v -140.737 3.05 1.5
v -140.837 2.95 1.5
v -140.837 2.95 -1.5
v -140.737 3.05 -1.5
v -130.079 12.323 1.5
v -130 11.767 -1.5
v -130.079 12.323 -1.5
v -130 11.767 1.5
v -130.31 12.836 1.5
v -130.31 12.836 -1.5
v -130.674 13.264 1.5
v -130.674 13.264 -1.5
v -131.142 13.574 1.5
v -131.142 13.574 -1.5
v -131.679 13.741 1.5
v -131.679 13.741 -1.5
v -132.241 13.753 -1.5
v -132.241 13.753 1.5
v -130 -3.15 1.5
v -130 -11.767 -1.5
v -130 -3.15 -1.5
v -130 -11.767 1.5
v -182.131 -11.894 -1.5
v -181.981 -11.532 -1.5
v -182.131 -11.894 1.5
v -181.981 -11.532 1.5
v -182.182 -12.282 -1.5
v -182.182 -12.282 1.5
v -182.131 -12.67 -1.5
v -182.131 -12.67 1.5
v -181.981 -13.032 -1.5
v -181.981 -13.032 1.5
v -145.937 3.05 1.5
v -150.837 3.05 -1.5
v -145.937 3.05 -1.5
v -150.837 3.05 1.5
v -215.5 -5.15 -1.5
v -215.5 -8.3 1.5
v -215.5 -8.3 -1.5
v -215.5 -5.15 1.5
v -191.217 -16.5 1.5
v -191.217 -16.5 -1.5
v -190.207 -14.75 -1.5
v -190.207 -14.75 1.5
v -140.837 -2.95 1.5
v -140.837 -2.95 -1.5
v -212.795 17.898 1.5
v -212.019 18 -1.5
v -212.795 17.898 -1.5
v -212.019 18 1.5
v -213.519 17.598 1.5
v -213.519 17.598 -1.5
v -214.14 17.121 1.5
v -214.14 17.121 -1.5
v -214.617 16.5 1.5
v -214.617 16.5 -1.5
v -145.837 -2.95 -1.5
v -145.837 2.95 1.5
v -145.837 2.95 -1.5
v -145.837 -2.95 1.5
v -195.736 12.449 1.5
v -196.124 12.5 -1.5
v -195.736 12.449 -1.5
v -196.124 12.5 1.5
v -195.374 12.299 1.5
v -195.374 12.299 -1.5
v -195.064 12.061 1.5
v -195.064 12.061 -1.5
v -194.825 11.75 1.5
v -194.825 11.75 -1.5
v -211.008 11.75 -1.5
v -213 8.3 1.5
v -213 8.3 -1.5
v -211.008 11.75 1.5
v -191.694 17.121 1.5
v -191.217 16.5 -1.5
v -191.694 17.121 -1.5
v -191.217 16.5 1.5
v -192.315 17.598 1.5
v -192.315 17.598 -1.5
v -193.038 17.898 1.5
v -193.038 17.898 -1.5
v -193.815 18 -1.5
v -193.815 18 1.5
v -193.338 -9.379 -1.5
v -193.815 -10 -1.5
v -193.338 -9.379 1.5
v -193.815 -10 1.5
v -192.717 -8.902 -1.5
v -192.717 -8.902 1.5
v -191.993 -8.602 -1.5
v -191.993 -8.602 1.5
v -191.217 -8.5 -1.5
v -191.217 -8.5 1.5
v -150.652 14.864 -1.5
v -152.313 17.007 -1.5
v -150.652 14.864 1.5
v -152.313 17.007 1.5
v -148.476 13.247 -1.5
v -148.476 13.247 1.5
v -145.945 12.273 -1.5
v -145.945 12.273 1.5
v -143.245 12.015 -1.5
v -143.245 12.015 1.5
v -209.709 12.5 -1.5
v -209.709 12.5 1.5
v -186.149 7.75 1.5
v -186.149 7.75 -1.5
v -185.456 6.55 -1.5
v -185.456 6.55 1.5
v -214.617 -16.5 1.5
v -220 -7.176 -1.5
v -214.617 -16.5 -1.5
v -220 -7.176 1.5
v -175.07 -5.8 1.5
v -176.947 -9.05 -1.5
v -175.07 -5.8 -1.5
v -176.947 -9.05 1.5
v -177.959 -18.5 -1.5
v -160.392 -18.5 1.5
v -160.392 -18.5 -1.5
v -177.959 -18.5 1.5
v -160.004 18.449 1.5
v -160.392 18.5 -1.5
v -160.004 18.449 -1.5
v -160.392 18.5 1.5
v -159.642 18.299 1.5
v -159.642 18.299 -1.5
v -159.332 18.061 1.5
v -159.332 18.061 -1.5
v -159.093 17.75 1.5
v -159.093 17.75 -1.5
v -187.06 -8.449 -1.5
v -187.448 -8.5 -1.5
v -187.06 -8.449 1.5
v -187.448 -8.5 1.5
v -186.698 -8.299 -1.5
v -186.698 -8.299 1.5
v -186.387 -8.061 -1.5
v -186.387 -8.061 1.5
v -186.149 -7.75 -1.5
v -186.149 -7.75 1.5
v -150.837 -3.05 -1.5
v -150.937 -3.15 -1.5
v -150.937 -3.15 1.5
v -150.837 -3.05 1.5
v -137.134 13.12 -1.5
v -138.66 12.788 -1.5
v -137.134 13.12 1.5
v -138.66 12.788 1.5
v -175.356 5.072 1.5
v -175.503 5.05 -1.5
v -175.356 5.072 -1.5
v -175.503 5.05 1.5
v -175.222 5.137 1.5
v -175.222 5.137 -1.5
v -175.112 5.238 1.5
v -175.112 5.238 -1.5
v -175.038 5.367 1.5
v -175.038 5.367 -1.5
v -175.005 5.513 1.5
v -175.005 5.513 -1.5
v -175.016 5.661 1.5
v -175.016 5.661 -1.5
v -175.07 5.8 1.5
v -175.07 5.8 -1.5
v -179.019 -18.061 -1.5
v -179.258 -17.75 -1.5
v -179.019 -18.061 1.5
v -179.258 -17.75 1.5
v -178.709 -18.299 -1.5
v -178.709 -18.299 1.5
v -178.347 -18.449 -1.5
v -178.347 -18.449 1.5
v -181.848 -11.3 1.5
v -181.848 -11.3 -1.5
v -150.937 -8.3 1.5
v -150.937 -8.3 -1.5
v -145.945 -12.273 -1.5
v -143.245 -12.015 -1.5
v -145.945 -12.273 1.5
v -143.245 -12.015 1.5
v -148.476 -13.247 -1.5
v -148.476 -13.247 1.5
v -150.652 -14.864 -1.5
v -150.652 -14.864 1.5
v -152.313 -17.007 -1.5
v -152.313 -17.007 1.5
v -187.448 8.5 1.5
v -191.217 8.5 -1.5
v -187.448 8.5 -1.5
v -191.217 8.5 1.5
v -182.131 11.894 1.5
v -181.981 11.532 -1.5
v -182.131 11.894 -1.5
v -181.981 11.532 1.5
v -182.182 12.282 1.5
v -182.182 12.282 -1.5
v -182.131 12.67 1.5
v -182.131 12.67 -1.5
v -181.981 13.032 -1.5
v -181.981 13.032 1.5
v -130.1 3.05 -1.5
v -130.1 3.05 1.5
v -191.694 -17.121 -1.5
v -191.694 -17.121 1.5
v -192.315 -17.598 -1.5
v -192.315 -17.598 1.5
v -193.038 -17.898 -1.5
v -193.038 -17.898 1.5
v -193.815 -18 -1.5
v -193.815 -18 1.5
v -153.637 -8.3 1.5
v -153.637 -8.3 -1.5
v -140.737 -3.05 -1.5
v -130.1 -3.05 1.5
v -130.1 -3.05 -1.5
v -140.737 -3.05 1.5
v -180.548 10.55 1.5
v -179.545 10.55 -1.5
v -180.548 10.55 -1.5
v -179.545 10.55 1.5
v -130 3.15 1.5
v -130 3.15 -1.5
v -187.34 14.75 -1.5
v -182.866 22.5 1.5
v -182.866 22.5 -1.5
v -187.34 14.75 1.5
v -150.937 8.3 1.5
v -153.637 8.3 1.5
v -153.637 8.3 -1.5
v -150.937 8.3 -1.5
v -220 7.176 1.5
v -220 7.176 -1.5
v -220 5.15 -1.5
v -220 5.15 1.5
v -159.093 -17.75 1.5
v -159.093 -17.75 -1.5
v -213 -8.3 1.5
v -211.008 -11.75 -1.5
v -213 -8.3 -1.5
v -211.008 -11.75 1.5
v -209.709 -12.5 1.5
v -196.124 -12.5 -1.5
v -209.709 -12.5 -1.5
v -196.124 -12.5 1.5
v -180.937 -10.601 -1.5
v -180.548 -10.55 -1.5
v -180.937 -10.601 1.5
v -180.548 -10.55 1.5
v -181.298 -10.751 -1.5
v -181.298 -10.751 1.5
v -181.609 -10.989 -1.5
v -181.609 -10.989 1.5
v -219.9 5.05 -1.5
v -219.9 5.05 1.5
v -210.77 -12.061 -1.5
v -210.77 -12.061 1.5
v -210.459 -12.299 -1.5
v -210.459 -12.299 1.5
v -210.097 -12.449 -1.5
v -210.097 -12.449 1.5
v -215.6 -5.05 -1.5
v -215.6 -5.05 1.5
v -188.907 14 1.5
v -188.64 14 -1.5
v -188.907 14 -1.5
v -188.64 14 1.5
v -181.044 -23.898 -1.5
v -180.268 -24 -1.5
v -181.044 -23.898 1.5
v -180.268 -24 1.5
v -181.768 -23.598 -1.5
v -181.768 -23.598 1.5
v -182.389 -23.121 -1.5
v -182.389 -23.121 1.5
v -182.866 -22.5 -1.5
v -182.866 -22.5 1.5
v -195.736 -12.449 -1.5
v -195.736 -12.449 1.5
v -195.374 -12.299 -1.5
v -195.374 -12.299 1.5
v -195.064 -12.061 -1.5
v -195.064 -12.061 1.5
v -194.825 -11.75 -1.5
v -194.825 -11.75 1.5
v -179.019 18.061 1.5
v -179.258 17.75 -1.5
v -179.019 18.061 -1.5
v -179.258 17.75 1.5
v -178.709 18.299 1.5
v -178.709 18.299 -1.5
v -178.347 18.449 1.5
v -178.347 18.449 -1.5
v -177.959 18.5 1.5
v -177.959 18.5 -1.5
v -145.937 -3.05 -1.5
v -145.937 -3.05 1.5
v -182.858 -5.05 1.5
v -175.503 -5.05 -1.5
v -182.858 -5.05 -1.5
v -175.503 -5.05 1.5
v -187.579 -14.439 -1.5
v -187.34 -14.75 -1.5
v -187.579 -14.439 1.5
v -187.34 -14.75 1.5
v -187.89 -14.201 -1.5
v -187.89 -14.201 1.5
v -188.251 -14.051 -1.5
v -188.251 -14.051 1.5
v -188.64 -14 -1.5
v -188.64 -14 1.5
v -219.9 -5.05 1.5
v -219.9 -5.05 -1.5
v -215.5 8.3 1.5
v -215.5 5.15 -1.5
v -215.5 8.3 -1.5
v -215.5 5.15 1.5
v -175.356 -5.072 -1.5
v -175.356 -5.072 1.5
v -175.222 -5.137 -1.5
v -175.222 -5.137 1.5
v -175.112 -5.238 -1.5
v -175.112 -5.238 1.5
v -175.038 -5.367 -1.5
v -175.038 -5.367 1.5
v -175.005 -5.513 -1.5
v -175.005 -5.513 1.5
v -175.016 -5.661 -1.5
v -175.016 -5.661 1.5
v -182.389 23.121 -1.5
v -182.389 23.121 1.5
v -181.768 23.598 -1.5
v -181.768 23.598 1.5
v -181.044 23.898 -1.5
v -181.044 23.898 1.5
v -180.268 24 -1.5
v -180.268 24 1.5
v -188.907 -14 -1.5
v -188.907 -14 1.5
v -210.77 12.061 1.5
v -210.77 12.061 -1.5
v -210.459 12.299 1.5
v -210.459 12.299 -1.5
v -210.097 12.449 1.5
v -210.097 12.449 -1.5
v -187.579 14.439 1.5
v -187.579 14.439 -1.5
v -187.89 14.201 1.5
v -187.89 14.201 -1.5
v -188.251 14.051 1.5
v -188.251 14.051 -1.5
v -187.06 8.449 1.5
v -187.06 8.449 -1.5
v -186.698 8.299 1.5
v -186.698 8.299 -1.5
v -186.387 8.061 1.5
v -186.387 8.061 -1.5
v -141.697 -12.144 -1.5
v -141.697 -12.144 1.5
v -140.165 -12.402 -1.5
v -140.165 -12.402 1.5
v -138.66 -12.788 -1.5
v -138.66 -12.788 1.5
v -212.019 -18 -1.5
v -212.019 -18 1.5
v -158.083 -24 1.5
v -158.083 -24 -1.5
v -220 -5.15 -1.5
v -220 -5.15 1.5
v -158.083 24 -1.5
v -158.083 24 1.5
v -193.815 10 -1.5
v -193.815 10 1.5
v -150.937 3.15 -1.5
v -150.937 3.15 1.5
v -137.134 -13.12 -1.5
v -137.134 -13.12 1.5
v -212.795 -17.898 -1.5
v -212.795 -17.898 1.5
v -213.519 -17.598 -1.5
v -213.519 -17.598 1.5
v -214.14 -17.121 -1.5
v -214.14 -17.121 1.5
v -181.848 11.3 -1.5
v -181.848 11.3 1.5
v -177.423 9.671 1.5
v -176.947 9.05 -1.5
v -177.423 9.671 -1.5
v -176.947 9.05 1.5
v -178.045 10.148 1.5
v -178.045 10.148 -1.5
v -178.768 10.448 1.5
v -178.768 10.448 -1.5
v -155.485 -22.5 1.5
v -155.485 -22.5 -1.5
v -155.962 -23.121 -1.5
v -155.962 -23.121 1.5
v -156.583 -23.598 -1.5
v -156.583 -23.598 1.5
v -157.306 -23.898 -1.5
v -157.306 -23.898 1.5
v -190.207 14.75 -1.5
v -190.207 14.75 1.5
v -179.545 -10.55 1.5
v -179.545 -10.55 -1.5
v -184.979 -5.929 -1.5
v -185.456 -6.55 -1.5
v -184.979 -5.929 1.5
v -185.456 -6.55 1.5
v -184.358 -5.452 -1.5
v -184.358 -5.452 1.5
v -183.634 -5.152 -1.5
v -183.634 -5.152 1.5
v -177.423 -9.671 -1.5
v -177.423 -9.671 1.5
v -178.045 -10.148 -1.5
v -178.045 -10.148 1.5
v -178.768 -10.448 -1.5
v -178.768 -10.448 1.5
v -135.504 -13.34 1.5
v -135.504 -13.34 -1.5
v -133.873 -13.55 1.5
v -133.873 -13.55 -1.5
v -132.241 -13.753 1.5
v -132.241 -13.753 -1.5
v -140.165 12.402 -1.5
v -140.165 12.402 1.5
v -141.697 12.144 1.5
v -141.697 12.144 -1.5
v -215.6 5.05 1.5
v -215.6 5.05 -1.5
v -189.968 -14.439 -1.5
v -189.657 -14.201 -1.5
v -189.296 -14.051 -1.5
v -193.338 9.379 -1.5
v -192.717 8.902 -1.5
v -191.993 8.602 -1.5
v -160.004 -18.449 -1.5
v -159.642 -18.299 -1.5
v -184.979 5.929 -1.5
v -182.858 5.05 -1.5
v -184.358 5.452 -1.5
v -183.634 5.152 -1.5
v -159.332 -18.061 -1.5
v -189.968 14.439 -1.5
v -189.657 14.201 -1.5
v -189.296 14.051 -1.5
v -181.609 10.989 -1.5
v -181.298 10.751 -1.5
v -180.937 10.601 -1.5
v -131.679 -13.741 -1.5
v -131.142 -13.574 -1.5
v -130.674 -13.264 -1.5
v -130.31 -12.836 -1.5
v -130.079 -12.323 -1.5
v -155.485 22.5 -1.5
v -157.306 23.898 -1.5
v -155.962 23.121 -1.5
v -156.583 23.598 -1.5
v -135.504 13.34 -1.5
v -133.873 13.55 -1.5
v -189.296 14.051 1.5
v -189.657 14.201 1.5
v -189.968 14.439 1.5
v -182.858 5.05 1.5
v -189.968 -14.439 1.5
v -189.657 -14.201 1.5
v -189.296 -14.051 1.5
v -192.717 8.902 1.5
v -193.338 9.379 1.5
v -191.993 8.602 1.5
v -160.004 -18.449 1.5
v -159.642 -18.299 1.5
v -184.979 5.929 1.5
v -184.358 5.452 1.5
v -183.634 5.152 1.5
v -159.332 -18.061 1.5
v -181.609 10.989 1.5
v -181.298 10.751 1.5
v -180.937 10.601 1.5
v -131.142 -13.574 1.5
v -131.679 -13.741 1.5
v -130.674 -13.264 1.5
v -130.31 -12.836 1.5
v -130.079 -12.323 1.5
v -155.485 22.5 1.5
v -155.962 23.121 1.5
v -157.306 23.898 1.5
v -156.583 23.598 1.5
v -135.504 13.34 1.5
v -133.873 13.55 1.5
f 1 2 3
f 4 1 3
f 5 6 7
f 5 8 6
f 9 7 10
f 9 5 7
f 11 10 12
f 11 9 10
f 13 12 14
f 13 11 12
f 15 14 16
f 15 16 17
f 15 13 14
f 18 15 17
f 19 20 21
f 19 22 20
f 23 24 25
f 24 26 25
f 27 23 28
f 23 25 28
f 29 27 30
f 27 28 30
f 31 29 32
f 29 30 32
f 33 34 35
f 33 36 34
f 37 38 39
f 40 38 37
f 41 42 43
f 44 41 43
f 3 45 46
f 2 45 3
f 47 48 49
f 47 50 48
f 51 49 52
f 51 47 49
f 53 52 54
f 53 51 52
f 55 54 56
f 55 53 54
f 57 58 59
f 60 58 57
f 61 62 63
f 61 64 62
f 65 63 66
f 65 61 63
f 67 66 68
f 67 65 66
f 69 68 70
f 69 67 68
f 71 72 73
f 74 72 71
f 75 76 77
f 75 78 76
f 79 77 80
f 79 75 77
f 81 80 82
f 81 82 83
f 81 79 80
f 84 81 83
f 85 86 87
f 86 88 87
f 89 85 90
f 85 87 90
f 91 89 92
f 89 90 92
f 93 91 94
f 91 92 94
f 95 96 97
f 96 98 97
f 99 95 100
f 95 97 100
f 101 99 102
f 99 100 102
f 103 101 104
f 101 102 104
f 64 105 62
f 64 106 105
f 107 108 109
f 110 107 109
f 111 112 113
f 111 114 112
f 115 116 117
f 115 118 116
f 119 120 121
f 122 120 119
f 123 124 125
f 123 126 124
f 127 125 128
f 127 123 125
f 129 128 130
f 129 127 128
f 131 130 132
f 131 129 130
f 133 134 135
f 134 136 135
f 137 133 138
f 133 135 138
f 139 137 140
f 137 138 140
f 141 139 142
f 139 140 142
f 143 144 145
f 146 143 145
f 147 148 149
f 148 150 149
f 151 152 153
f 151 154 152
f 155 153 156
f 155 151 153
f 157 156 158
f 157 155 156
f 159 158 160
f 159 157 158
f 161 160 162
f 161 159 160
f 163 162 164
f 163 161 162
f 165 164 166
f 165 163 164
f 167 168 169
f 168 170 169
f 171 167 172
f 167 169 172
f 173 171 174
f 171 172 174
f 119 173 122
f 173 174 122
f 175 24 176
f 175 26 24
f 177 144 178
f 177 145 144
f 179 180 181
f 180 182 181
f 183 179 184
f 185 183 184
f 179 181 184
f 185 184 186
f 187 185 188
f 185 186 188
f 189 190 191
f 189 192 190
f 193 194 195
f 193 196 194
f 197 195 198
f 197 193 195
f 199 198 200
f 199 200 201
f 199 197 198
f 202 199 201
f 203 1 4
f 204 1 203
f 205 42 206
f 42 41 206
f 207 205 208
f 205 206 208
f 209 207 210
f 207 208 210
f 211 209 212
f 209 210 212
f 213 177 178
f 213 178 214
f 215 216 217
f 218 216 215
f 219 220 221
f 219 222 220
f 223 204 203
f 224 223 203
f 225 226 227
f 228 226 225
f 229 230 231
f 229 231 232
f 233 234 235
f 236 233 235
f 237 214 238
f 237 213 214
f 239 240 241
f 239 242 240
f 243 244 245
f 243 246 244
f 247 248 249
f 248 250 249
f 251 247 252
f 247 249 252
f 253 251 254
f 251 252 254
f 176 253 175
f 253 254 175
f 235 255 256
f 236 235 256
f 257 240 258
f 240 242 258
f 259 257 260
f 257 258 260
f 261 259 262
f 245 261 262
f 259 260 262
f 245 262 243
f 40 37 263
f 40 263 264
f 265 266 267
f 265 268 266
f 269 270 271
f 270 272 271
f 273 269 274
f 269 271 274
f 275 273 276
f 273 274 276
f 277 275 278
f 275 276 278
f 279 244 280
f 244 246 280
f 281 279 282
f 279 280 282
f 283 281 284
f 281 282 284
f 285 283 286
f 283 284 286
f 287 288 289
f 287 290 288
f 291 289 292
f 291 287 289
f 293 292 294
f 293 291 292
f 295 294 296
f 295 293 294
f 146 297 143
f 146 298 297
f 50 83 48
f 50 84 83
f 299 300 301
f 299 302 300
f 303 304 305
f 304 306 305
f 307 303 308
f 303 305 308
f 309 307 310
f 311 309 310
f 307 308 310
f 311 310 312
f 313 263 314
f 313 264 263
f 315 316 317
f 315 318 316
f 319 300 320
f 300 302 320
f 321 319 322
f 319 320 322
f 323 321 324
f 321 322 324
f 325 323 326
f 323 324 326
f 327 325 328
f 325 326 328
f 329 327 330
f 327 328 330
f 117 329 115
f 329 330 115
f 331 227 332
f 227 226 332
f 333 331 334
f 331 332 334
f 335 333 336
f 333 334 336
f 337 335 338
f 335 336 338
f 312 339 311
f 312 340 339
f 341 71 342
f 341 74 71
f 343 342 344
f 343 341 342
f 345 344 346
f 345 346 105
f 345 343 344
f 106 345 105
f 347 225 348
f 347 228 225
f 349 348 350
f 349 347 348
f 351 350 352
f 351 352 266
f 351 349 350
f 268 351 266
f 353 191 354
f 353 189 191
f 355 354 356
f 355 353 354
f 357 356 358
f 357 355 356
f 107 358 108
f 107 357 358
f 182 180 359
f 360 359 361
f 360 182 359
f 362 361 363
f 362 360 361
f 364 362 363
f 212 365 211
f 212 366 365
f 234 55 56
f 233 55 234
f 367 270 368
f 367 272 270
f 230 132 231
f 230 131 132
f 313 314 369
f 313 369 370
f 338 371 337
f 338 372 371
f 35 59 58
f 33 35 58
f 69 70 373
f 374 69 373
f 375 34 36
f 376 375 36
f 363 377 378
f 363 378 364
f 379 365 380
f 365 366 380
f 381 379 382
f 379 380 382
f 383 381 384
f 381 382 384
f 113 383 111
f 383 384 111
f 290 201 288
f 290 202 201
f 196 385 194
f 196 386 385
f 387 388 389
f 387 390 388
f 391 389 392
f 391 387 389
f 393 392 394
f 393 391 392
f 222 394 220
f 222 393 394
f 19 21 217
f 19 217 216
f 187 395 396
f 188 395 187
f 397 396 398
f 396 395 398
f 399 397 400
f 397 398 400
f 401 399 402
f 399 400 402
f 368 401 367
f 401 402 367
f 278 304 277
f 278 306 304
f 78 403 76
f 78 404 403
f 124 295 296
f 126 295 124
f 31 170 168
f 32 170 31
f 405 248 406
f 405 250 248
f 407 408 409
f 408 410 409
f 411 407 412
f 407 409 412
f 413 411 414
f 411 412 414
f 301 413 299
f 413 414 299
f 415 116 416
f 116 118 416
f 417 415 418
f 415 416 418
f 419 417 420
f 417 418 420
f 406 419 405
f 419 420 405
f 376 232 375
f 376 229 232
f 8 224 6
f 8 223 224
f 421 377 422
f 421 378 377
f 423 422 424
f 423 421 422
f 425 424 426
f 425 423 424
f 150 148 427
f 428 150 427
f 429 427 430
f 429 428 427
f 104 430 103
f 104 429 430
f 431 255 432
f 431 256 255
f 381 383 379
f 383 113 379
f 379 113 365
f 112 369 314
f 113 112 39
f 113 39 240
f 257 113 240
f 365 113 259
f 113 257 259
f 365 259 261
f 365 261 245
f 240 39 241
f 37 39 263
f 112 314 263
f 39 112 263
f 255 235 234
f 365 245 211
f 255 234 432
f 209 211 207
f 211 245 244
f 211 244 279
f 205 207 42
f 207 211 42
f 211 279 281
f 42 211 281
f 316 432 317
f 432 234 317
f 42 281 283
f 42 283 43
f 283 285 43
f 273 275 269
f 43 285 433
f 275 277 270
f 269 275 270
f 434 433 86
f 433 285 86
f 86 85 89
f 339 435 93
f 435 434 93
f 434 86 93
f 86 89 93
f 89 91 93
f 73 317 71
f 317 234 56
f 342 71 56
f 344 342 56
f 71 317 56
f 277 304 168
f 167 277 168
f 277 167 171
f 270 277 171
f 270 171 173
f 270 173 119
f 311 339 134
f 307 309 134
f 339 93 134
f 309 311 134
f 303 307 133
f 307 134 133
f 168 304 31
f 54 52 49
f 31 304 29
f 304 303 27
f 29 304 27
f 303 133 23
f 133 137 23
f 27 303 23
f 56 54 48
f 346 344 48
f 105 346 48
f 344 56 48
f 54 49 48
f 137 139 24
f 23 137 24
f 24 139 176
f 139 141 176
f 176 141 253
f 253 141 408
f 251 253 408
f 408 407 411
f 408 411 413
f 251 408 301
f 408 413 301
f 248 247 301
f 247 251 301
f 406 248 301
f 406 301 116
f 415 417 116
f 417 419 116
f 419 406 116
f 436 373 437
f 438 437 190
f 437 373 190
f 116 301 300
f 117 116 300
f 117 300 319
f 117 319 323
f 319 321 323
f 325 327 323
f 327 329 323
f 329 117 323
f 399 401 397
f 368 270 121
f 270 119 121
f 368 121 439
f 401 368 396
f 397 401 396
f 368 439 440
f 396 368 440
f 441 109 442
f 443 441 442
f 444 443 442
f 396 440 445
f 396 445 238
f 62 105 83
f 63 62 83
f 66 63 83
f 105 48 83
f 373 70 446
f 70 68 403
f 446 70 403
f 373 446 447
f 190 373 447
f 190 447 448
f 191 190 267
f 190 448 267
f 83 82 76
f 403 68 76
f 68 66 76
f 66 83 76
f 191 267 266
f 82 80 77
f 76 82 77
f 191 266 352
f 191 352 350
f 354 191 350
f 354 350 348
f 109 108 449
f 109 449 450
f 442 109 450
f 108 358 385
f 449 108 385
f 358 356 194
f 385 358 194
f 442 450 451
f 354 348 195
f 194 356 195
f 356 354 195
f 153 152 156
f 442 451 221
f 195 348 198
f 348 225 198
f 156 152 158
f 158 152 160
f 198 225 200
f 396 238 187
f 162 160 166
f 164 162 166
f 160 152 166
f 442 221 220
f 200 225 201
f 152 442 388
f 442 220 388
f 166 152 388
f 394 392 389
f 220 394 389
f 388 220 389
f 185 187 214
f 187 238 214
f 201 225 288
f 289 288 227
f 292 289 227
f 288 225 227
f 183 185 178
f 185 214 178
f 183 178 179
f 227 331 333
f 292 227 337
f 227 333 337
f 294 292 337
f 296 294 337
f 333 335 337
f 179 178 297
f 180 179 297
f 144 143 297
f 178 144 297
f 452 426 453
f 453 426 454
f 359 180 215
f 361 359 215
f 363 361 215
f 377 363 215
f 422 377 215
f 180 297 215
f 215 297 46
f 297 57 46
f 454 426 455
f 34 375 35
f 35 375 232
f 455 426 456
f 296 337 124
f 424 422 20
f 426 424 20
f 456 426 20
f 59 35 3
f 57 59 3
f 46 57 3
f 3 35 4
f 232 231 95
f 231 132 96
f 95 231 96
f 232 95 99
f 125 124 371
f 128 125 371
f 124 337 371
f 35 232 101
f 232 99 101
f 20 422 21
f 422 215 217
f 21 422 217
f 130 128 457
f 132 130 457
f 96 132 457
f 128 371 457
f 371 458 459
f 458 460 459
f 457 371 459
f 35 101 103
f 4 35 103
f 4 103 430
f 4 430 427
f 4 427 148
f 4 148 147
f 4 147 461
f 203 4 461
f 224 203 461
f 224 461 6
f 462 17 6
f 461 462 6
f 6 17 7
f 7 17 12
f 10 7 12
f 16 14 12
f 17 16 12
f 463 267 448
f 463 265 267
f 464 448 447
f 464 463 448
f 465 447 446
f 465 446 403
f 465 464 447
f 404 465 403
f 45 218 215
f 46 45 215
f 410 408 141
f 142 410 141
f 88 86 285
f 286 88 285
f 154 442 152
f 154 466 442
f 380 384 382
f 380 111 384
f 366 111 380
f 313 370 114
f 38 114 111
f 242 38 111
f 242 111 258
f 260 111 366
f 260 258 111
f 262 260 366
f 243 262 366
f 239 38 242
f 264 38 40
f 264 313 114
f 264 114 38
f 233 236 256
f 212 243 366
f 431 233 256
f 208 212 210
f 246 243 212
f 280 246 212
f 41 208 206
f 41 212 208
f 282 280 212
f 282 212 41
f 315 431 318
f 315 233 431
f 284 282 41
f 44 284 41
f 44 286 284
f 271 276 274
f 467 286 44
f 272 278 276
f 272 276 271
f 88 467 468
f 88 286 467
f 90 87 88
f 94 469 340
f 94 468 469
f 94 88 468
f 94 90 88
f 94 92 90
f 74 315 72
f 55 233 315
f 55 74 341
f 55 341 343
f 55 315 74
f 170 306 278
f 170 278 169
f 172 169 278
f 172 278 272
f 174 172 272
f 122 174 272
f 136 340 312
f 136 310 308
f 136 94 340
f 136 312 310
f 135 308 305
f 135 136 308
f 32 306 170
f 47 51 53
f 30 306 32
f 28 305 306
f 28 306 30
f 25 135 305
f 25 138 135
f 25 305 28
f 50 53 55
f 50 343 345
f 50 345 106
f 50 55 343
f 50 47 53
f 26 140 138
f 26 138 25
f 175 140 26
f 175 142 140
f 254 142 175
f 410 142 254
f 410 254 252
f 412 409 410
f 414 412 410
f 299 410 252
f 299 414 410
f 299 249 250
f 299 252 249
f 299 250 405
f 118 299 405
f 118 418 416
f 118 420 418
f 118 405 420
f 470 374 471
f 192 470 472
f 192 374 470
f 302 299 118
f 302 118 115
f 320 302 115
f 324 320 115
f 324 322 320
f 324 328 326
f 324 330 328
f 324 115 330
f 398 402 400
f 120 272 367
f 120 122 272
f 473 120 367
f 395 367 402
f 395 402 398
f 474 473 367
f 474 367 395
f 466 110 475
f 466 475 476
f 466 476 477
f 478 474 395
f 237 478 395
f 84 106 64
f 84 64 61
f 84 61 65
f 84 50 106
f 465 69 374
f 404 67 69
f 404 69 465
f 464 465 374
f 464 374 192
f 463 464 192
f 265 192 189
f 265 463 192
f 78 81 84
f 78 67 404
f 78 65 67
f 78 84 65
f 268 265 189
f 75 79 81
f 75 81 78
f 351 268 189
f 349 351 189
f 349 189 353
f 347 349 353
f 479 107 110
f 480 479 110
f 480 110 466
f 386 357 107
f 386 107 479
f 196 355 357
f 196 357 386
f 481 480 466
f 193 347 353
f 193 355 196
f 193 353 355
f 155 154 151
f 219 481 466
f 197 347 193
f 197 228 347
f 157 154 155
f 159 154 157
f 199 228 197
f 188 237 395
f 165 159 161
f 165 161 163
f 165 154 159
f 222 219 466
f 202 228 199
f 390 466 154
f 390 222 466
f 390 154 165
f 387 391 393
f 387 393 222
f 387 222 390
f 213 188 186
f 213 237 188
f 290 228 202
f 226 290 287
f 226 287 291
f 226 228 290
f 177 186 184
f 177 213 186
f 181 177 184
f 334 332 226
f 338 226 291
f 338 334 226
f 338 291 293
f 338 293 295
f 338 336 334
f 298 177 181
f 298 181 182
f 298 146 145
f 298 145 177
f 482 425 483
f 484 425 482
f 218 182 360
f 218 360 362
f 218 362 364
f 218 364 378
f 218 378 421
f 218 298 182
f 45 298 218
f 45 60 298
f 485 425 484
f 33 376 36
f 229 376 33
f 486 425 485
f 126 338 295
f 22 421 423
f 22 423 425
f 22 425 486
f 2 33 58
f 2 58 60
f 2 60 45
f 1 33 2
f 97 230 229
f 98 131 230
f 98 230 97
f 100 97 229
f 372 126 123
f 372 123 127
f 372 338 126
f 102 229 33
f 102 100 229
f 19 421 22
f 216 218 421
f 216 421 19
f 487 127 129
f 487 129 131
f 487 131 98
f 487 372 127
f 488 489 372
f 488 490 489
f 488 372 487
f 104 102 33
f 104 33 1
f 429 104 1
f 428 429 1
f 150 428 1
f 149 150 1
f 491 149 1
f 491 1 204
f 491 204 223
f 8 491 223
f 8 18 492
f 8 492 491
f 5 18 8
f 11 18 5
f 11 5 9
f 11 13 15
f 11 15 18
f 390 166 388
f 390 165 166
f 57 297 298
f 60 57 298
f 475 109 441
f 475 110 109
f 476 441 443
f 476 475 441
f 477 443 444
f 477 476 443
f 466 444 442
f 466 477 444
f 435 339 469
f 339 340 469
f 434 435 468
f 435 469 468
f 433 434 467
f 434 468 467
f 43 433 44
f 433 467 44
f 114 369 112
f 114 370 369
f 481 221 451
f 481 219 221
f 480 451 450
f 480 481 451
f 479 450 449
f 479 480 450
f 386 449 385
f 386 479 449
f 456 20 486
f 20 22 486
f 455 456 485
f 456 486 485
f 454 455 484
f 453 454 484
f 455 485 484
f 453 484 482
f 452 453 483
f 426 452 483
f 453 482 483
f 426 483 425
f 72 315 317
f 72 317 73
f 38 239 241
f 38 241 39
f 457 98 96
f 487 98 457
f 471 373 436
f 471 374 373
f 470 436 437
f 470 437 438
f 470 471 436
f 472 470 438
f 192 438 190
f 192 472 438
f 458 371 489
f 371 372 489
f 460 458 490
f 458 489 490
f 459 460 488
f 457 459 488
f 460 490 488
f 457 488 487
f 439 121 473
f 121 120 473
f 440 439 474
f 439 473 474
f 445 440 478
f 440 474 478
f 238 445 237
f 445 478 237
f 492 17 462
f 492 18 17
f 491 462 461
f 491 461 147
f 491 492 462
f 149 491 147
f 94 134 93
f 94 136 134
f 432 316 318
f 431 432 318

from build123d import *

# Parameters (mm, degrees)
EXTRUDE_1_DEPTH = 1.5
FILLET_4_R      = 10
FILLET_7_R      = 1.5
FILLET_8_R      = 3
CHAMFER_1_SIZE  = 0.1
FILLET_9_R      = 2
FILLET_10_R     = 0.5


with BuildPart() as part:
    # 草图1 → 凸台-拉伸1 (new, symmetric)
    with BuildSketch(Plane.XY):
        with BuildLine():
            Line((-130, 3.05), (-130, 14.015709241))
            ThreePointArc((-130, 14.015709241), (-134.003306479, 13.533897343), (-138, 13))
            ThreePointArc((-138, 13), (-144, 12), (-150, 13))
            Line((-150, 13), (-156.350852961, 24))
            Line((-156.350852961, 24), (-182, 24))
            Line((-182, 24), (-187.773502692, 14))
            Line((-187.773502692, 14), (-189.773502692, 14))
            Line((-189.773502692, 14), (-192.082903769, 18))
            Line((-192.082903769, 18), (-213.75055535, 18))
            Line((-213.75055535, 18), (-220, 7.175644347))
            Line((-220, 7.175644347), (-220, 5.05))
            Line((-220, 5.05), (-215.5, 5.05))
            Line((-215.5, 5.05), (-215.5, 8.3))
            Line((-215.5, 8.3), (-213, 8.3))
            Line((-213, 8.3), (-210.575128869, 12.5))
            Line((-210.575128869, 12.5), (-195.258330249, 12.5))
            Line((-195.258330249, 12.5), (-192.948929172, 8.5))
            Line((-192.948929172, 8.5), (-186.581793069, 8.5))
            Line((-186.581793069, 8.5), (-184.58993464, 5.05))
            Line((-184.58993464, 5.05), (-174.637306696, 5.05))
            Line((-174.637306696, 5.05), (-177.812733176, 10.55))
            Line((-177.812733176, 10.55), (-181.41450816, 10.55))
            Line((-181.41450816, 10.55), (-182.41450816, 12.282050808))
            Line((-182.41450816, 12.282050808), (-178.824573519, 18.5))
            Line((-178.824573519, 18.5), (-159.526279442, 18.5))
            Line((-159.526279442, 18.5), (-153.637306696, 8.3))
            Line((-153.637306696, 8.3), (-150.937306696, 8.3))
            Line((-150.937306696, 8.3), (-150.937306696, 3.05))
            Line((-150.937306696, 3.05), (-145.837306696, 3.05))
            Line((-145.837306696, 3.05), (-145.837306696, -3.05))
            Line((-145.837306696, -3.05), (-150.937306696, -3.05))
            Line((-150.937306696, -3.05), (-150.937306696, -8.3))
            Line((-150.937306696, -8.3), (-153.637306696, -8.3))
            Line((-153.637306696, -8.3), (-159.526279442, -18.5))
            Line((-159.526279442, -18.5), (-178.824573519, -18.5))
            Line((-178.824573519, -18.5), (-182.41450816, -12.282050808))
            Line((-182.41450816, -12.282050808), (-181.41450816, -10.55))
            Line((-181.41450816, -10.55), (-177.812733176, -10.55))
            Line((-177.812733176, -10.55), (-174.637306696, -5.05))
            Line((-174.637306696, -5.05), (-184.58993464, -5.05))
            Line((-184.58993464, -5.05), (-186.581793069, -8.5))
            Line((-186.581793069, -8.5), (-192.948929172, -8.5))
            Line((-192.948929172, -8.5), (-195.258330249, -12.5))
            Line((-195.258330249, -12.5), (-210.575128869, -12.5))
            Line((-210.575128869, -12.5), (-213, -8.3))
            Line((-213, -8.3), (-215.5, -8.3))
            Line((-215.5, -8.3), (-215.5, -5.05))
            Line((-215.5, -5.05), (-220, -5.05))
            Line((-220, -5.05), (-220, -7.175644347))
            Line((-220, -7.175644347), (-213.75055535, -18))
            Line((-213.75055535, -18), (-192.082903769, -18))
            Line((-192.082903769, -18), (-189.773502692, -14))
            Line((-189.773502692, -14), (-187.773502692, -14))
            Line((-187.773502692, -14), (-182, -24))
            Line((-182, -24), (-156.350852961, -24))
            Line((-156.350852961, -24), (-150, -13))
            ThreePointArc((-150, -13), (-144, -12), (-138, -13))
            ThreePointArc((-138, -13), (-134.003306479, -13.533897343), (-130, -14.015709241))
            Line((-130, -14.015709241), (-130, -3.05))
            Line((-130, -3.05), (-140.837306696, -3.05))
            Line((-140.837306696, -3.05), (-140.837306696, 3.05))
            Line((-140.837306696, 3.05), (-130, 3.05))
        make_face()
    extrude(amount=EXTRUDE_1_DEPTH, both=True)

    # 圆角4
    fillet_4_edges = [part.edges().sort_by_distance(p)[0] for p in [
        (-138, 13, 0),
        (-138, -13, 0),
        (-150, -13, 0),
        (-150, 13, 0),
    ]]
    fillet(fillet_4_edges, radius=FILLET_4_R)

    # 圆角7
    fillet_7_edges = [part.edges().sort_by_distance(p)[0] for p in [
        (-187.773502692, -14, 0),
        (-189.773502692, -14, 0),
        (-210.575128869, -12.5, 0),
        (-195.258330249, -12.5, 0),
        (-186.581793069, -8.5, 0),
        (-181.41450816, -10.55, 0),
        (-182.41450816, -12.282050808, 0),
        (-178.824573519, -18.5, 0),
        (-159.526279442, -18.5, 0),
        (-159.526279442, 18.5, 0),
        (-178.824573519, 18.5, 0),
        (-182.41450816, 12.282050808, 0),
        (-181.41450816, 10.55, 0),
        (-186.581793069, 8.5, 0),
        (-195.258330249, 12.5, 0),
        (-210.575128869, 12.5, 0),
        (-189.773502692, 14, 0),
        (-187.773502692, 14, 0),
    ]]
    fillet(fillet_7_edges, radius=FILLET_7_R)

    # 圆角8
    fillet_8_edges = [part.edges().sort_by_distance(p)[0] for p in [
        (-156.350852961, -24, 0),
        (-182, -24, 0),
        (-192.082903769, -18, 0),
        (-213.75055535, -18, 0),
        (-192.948929172, -8.5, 0),
        (-184.58993464, -5.05, 0),
        (-177.812733176, -10.55, 0),
        (-177.812733176, 10.55, 0),
        (-184.58993464, 5.05, 0),
        (-192.948929172, 8.5, 0),
        (-213.75055535, 18, 0),
        (-192.082903769, 18, 0),
        (-182, 24, 0),
        (-156.350852961, 24, 0),
    ]]
    fillet(fillet_8_edges, radius=FILLET_8_R)

    # 倒角1
    chamfer_1_edges = [part.edges().sort_by_distance(p)[0] for p in [
        (-130, 3.05, 0),
        (-140.837306696, 3.05, 0),
        (-140.837306696, -3.05, 0),
        (-130, -3.05, 0),
        (-220, -5.05, 0),
        (-215.5, -5.05, 0),
        (-150.937306696, -3.05, 0),
        (-145.837306696, -3.05, 0),
        (-145.837306696, 3.05, 0),
        (-150.937306696, 3.05, 0),
        (-215.5, 5.05, 0),
        (-220, 5.05, 0),
    ]]
    chamfer(chamfer_1_edges, length=CHAMFER_1_SIZE)

    # 圆角9
    fillet_9_edges = [part.edges().sort_by_distance(p)[0] for p in [
        (-130, 14.015709241, 0),
        (-130, -14.015709241, 0),
    ]]
    fillet(fillet_9_edges, radius=FILLET_9_R)

    # 圆角10
    fillet_10_edges = [part.edges().sort_by_distance(p)[0] for p in [
        (-174.637306696, -5.05, 0),
        (-174.637306696, 5.05, 0),
    ]]
    fillet(fillet_10_edges, radius=FILLET_10_R)


solid = part.part
